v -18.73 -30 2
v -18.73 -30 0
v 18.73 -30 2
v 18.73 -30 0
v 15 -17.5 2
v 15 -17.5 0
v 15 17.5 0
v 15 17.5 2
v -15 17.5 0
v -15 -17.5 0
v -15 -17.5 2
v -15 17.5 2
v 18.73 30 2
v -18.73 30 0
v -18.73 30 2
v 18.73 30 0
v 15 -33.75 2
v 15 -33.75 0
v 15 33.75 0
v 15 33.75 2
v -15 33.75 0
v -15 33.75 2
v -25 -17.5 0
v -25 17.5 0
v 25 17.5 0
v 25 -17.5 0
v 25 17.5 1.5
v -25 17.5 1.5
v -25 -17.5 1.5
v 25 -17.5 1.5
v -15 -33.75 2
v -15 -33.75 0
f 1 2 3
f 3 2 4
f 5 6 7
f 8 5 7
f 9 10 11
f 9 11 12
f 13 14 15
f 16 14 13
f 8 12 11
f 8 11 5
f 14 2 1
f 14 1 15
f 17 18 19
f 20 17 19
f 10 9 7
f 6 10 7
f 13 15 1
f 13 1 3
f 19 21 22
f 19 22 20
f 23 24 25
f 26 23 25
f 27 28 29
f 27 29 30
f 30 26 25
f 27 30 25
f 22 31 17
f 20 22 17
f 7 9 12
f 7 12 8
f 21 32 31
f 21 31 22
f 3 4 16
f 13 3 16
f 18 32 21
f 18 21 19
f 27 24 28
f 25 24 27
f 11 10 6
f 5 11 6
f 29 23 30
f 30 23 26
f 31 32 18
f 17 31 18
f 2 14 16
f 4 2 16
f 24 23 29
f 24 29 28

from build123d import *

# Parameters (mm, degrees)
F0_W     = 30
F0_H     = 35
F1_DEPTH = 2
F2_W     = 30
F2_H     = 67.5
F3_DEPTH = 2
F4_W     = 50
F4_H     = 35
F5_DEPTH = 1.5
F6_W     = 37.461
F6_H     = 60
F7_DEPTH = 2


with BuildPart() as f1:
    # F0 (on Top) → F1 (new body)
    with BuildSketch(Plane.XY):
        Rectangle(F0_W, F0_H)
    extrude(amount=F1_DEPTH)


with BuildPart() as f3:
    # F2 (on Top) → F3 (new body)
    with BuildSketch(Plane.XY):
        Rectangle(F2_W, F2_H)
    extrude(amount=F3_DEPTH)


with BuildPart() as f5:
    # F4 (on Top) → F5 (new body)
    with BuildSketch(Plane.XY):
        Rectangle(F4_W, F4_H)
    extrude(amount=F5_DEPTH)


with BuildPart() as f7:
    # F6 (on Top) → F7 (new body)
    with BuildSketch(Plane.XY):
        Rectangle(F6_W, F6_H)
    extrude(amount=F7_DEPTH)


solid = Compound([f1.part, f3.part, f5.part, f7.part])
